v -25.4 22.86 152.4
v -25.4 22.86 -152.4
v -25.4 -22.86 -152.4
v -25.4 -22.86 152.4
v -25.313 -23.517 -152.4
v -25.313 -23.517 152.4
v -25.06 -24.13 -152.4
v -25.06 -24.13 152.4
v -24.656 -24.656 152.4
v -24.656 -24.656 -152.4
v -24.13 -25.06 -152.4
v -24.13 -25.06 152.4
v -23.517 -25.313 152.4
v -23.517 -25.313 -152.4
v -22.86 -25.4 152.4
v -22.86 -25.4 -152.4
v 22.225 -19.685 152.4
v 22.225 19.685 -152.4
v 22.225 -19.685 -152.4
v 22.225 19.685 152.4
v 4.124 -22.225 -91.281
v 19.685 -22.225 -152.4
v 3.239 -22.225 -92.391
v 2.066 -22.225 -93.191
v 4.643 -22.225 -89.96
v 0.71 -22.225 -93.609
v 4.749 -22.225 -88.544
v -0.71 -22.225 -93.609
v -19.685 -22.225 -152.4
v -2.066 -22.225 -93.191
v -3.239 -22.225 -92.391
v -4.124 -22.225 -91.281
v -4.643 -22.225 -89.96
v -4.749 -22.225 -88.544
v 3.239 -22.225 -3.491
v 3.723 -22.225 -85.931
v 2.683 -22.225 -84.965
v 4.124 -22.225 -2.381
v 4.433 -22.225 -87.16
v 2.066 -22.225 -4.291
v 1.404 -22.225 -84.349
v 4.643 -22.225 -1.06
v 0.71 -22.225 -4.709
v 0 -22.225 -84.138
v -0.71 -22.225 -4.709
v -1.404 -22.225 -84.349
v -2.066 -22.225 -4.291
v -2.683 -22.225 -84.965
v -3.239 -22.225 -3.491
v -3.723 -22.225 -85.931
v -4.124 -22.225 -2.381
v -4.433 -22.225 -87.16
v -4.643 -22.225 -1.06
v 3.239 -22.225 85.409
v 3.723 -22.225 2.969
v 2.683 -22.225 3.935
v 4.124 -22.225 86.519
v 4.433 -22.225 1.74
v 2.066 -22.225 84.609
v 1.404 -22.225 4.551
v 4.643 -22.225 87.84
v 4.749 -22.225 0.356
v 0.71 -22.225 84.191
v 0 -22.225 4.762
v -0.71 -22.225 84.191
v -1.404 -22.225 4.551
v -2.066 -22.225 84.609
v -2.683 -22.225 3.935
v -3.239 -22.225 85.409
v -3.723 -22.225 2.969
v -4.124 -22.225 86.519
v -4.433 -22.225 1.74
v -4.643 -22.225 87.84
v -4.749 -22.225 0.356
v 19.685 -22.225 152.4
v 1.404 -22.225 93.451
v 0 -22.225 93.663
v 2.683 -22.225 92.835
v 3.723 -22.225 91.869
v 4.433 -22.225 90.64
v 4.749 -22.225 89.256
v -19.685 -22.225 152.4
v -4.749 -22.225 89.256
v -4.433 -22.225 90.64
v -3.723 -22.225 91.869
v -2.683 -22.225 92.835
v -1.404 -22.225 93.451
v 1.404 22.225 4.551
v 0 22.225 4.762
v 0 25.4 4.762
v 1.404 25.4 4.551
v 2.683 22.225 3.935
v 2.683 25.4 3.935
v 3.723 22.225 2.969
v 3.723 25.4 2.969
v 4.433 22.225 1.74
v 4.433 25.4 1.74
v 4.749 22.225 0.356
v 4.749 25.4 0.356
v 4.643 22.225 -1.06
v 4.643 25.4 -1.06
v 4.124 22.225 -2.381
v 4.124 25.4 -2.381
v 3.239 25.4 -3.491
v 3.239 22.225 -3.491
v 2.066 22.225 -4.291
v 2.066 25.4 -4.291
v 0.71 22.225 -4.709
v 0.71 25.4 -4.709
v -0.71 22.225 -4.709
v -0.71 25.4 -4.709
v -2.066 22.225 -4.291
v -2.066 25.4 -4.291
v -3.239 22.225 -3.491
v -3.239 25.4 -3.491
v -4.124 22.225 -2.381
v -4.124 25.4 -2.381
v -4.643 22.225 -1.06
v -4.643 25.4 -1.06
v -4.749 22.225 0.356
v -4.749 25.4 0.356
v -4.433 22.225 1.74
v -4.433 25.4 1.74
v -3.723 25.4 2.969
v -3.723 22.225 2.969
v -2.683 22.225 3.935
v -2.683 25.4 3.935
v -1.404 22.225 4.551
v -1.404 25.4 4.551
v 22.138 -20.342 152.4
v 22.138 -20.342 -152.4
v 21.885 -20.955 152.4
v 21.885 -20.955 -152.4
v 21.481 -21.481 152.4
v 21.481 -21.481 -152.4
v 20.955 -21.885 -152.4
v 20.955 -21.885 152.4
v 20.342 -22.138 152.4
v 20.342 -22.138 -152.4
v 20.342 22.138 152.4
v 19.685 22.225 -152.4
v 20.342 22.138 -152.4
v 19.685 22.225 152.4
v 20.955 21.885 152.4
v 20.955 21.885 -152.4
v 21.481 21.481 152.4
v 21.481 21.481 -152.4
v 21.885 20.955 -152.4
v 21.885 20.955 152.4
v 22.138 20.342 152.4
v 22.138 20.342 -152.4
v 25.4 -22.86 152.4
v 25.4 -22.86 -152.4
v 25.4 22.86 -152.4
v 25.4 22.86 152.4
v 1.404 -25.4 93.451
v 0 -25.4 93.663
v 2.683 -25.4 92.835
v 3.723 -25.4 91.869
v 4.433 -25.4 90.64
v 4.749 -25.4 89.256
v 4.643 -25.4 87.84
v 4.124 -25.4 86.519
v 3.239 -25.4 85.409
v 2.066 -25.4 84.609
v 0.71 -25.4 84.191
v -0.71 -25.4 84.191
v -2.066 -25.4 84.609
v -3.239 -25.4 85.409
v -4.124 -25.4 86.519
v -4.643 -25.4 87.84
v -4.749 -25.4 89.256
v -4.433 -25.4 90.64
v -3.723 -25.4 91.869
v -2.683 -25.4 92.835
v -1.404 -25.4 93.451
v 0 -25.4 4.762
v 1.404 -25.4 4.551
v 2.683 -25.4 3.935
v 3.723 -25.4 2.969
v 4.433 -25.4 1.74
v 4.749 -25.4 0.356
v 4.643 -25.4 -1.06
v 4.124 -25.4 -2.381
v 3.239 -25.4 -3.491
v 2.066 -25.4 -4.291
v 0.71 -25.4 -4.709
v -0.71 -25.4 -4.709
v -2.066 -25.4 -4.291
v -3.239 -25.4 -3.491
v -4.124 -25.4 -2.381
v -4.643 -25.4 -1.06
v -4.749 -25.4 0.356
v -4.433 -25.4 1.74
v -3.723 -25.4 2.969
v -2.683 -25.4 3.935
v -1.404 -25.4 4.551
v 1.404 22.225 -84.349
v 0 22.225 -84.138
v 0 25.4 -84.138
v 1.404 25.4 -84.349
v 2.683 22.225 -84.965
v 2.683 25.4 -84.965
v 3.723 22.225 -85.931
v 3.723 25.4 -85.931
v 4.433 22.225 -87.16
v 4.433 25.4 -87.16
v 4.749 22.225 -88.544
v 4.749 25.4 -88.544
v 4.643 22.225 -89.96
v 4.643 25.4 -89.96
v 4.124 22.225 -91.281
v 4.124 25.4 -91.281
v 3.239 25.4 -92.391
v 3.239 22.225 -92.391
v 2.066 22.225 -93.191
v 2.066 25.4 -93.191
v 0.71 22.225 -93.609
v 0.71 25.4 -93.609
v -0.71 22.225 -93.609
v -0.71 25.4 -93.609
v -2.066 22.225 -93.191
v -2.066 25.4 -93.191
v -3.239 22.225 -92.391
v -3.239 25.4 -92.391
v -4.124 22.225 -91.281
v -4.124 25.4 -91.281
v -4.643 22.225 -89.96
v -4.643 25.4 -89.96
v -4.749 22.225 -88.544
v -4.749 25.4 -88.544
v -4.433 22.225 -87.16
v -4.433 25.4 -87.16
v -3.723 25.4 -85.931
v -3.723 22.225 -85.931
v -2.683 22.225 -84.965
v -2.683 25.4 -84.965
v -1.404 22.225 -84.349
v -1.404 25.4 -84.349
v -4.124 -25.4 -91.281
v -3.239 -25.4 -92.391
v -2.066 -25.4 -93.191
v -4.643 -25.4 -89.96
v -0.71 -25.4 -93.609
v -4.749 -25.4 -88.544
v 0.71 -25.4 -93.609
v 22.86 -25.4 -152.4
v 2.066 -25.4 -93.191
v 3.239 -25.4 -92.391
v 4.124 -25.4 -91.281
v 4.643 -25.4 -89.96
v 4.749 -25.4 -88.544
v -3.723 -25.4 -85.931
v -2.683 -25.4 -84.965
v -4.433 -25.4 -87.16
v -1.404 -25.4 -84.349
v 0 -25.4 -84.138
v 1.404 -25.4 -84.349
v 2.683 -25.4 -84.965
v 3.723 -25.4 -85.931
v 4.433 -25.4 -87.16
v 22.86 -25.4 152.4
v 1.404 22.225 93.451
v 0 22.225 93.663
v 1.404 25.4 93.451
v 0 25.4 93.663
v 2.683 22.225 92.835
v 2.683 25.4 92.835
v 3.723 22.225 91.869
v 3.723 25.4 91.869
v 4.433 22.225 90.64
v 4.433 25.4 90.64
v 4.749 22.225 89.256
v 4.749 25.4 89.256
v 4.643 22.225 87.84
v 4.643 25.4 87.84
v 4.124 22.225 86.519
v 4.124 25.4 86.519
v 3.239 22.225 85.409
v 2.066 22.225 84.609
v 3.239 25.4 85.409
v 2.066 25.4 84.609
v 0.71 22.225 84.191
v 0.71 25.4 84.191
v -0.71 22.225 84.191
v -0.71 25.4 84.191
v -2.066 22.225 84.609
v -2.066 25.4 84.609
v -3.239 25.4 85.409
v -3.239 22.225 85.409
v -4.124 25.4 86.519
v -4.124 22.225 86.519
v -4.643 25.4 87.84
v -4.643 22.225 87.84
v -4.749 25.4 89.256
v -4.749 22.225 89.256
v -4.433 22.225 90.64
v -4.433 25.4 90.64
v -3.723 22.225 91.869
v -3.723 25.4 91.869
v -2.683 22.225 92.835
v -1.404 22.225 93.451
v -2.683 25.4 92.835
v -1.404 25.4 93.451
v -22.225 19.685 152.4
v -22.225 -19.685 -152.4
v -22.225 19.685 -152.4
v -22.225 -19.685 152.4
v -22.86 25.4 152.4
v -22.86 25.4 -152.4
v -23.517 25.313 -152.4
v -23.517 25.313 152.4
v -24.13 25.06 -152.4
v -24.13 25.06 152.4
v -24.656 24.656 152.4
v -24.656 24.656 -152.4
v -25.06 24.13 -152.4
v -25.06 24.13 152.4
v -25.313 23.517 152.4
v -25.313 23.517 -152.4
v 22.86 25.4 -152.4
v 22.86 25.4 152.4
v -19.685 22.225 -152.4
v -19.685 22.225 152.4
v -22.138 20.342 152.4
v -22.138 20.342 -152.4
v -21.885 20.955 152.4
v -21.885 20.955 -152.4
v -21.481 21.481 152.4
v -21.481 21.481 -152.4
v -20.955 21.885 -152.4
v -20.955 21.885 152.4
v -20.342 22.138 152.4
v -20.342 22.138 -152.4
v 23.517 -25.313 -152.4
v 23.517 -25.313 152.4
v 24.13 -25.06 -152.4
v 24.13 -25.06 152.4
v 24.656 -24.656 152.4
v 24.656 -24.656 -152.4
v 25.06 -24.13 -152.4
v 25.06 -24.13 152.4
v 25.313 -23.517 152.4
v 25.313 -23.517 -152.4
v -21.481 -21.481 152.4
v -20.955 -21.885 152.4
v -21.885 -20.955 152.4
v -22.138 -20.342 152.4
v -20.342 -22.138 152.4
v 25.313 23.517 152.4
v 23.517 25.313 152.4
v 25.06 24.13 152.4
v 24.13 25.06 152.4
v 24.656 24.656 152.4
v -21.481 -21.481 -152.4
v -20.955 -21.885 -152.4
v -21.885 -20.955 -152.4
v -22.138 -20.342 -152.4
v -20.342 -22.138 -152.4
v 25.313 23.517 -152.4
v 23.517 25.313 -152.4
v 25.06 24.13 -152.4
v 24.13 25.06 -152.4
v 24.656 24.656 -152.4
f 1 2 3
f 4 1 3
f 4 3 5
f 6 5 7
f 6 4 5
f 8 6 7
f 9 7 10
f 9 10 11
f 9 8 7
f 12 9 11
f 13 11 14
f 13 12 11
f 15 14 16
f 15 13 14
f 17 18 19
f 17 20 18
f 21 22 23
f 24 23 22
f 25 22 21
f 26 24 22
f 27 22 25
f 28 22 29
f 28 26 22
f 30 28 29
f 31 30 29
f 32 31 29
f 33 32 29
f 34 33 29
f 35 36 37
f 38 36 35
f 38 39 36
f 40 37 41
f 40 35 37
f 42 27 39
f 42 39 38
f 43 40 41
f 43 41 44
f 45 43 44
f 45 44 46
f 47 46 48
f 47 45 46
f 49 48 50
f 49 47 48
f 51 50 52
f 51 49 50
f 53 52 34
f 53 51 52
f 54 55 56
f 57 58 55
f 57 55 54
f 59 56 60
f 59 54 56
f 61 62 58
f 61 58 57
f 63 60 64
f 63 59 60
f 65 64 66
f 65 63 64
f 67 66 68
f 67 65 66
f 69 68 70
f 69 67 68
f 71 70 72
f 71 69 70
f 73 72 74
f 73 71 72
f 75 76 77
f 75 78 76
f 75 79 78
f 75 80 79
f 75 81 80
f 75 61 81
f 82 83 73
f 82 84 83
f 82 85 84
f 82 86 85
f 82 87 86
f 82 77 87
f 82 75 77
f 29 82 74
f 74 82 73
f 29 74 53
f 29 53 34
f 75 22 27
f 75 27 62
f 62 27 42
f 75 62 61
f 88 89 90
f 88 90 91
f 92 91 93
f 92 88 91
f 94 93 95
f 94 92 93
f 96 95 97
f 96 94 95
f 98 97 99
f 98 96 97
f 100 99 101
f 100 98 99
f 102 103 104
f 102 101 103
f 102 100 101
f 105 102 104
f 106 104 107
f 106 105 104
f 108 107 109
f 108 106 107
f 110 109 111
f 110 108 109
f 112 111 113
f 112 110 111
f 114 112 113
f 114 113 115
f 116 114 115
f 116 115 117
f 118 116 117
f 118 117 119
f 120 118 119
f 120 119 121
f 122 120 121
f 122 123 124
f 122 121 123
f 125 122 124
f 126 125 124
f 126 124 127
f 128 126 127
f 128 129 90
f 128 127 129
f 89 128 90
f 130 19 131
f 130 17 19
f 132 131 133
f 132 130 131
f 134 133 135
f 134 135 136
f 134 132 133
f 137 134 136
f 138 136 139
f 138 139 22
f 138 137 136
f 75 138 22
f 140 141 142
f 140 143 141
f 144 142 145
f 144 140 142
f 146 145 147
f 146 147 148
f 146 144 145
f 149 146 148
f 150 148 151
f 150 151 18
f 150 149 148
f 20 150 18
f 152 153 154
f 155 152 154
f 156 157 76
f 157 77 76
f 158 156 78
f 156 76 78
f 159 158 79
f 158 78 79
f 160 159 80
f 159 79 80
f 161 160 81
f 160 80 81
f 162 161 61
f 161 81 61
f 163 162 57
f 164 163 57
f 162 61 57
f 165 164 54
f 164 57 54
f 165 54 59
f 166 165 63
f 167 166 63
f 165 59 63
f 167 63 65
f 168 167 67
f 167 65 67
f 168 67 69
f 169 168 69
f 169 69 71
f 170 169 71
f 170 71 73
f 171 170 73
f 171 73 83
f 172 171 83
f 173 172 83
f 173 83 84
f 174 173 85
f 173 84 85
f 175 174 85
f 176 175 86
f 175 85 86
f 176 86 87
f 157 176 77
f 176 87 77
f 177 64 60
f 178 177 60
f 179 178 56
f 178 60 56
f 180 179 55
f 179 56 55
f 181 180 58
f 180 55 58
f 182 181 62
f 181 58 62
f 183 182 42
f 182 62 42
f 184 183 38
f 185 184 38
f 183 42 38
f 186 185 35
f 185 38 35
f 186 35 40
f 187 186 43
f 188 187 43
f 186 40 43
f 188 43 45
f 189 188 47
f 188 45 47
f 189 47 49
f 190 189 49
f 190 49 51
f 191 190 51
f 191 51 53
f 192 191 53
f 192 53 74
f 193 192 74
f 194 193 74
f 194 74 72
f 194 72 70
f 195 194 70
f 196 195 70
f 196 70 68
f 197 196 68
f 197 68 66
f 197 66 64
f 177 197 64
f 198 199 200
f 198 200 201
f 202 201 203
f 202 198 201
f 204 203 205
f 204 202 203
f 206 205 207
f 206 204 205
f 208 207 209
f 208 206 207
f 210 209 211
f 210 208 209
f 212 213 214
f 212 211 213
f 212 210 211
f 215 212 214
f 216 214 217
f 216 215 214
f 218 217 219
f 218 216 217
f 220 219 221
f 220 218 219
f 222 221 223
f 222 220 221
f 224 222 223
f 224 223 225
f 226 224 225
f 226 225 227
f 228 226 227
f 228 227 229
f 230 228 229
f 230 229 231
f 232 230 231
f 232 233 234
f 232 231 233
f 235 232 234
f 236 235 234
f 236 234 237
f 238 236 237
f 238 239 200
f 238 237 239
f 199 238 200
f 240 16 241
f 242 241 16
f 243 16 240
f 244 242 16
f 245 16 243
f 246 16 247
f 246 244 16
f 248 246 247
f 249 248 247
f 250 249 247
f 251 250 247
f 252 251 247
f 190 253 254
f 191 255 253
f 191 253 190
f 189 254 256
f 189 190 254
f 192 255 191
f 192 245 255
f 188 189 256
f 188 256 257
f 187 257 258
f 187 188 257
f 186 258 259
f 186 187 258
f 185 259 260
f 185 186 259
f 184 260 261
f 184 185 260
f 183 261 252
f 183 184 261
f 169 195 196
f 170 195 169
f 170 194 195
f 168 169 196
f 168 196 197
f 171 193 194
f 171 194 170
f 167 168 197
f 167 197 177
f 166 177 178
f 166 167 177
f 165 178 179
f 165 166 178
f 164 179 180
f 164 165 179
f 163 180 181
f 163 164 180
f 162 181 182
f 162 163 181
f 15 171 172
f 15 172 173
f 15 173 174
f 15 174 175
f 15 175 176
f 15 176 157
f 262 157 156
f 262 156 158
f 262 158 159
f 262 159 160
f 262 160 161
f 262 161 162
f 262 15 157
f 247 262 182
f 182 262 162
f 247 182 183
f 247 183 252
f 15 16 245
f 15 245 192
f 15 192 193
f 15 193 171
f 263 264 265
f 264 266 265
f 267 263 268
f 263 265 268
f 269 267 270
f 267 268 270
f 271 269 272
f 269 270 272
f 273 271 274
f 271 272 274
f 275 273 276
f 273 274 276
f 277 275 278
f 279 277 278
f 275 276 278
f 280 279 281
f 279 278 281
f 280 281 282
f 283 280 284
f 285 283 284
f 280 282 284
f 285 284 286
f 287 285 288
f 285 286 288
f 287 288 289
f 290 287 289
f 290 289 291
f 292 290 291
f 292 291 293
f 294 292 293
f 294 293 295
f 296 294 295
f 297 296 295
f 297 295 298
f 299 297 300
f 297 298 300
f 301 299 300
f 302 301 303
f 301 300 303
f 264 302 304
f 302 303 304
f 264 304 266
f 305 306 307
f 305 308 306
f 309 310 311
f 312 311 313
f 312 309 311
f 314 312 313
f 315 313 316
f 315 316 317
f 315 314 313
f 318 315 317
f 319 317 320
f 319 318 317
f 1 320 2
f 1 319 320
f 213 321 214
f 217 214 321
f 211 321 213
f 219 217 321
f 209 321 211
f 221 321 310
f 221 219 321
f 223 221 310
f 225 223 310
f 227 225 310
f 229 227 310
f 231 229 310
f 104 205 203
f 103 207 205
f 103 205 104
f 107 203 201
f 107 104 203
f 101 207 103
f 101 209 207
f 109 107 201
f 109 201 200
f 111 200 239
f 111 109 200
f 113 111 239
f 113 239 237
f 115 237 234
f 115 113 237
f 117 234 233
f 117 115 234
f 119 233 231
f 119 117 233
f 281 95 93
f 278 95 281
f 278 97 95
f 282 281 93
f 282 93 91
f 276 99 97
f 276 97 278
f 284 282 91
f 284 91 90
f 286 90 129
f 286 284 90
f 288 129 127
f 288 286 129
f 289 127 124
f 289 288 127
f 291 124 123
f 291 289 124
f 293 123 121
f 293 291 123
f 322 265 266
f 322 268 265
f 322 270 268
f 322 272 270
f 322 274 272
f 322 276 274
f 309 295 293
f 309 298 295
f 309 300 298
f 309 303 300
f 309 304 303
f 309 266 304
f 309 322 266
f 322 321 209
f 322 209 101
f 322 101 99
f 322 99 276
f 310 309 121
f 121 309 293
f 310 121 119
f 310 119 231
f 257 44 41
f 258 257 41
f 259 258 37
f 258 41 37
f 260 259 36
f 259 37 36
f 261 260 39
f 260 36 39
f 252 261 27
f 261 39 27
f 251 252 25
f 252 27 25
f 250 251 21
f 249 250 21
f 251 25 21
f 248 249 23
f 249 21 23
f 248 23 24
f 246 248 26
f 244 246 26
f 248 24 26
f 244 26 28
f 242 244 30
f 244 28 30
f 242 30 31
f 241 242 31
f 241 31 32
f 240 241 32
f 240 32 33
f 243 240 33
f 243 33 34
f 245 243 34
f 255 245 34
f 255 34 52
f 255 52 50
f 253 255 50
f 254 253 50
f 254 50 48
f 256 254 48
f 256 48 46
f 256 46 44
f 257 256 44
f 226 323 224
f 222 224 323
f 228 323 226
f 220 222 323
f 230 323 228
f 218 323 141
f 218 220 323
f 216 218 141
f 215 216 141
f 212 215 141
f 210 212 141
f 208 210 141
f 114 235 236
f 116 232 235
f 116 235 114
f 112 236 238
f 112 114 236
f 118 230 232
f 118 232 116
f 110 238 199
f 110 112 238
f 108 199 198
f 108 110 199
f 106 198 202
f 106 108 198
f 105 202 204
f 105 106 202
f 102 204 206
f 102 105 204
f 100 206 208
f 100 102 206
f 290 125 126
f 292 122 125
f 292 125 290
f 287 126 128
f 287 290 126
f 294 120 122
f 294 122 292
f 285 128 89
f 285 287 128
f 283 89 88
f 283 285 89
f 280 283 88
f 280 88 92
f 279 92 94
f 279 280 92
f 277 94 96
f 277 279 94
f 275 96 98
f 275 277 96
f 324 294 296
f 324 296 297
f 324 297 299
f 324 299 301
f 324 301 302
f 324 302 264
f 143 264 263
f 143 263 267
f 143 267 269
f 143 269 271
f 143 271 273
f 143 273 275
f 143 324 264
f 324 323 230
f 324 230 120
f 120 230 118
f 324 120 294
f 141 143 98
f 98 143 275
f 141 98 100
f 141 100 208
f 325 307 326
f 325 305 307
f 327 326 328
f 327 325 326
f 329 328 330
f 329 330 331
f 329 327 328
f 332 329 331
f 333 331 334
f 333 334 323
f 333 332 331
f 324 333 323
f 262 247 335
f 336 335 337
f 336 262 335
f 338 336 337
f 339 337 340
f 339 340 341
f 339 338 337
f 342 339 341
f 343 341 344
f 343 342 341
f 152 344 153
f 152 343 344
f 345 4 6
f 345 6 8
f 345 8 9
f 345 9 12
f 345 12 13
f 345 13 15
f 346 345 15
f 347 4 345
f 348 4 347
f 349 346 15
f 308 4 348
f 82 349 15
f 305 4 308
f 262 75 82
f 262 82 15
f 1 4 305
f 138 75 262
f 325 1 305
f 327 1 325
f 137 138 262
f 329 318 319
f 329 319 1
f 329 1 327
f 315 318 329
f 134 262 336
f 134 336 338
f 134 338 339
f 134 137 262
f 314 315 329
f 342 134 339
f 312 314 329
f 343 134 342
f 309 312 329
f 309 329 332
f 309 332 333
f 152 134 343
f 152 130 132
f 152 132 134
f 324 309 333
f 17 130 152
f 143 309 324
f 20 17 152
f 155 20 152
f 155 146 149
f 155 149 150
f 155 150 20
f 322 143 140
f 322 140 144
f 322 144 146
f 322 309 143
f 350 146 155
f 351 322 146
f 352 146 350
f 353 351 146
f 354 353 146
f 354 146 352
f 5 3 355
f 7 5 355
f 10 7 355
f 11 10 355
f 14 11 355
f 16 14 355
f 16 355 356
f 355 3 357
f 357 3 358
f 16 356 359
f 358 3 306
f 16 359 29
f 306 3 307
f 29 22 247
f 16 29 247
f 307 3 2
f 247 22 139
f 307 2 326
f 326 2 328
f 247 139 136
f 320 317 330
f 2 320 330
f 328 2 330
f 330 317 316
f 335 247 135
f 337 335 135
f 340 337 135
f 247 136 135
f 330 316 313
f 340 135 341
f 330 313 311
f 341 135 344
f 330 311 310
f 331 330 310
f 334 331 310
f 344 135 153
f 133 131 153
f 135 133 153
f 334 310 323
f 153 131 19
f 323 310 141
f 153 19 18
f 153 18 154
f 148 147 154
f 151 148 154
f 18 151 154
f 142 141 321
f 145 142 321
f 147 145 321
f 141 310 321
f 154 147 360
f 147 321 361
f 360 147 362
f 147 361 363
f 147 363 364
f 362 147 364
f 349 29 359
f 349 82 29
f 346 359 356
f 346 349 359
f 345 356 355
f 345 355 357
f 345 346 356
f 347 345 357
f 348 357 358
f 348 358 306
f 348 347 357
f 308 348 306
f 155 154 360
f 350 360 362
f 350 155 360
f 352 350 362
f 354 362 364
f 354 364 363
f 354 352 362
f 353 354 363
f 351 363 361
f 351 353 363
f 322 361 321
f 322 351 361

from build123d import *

# Parameters (mm, degrees)
BOSS_EXTRUDE1_DEPTH = 152.4
SKETCH2_R           = 4.7625
CUT_EXTRUDE1_DEPTH  = 76.2


with BuildPart() as part:
    # Sketch1 → Boss-Extrude1 (new, symmetric)
    with BuildSketch(Plane.XY):
        with BuildLine():
            Line((-22.86, -25.4), (22.86, -25.4))
            ThreePointArc((22.86, -25.4), (24.656051224, -24.656051224), (25.4, -22.86))
            Line((25.4, -22.86), (25.4, 22.86))
            ThreePointArc((25.4, 22.86), (24.656051224, 24.656051224), (22.86, 25.4))
            Line((22.86, 25.4), (-22.86, 25.4))
            ThreePointArc((-22.86, 25.4), (-24.656051224, 24.656051224), (-25.4, 22.86))
            Line((-25.4, 22.86), (-25.4, -22.86))
            ThreePointArc((-25.4, -22.86), (-24.656051224, -24.656051224), (-22.86, -25.4))
        make_face()
        with BuildLine():
            Line((-19.685, 22.225), (19.685, 22.225))
            ThreePointArc((19.685, 22.225), (21.481051224, 21.481051224), (22.225, 19.685))
            Line((22.225, 19.685), (22.225, -19.685))
            ThreePointArc((22.225, -19.685), (21.481051224, -21.481051224), (19.685, -22.225))
            Line((19.685, -22.225), (-19.685, -22.225))
            ThreePointArc((-19.685, -22.225), (-21.481051224, -21.481051224), (-22.225, -19.685))
            Line((-22.225, -19.685), (-22.225, 19.685))
            ThreePointArc((-22.225, 19.685), (-21.481051224, 21.481051224), (-19.685, 22.225))
        make_face(mode=Mode.SUBTRACT)
    extrude(amount=BOSS_EXTRUDE1_DEPTH, both=True)

    # Sketch2 → Cut-Extrude1 (cut, symmetric)
    with BuildSketch(Plane(origin=(0, 0, 0), x_dir=(1, 0, 0), z_dir=(0, 1, 0))):
        with Locations(Location((0, 0, 0), (0, 0, 270))):
            Circle(SKETCH2_R)
        with Locations(Location((0, 88.9, 0), (0, 0, 270))):
            Circle(SKETCH2_R)
        with Locations(Location((0, -88.9, 0), (0, 0, 270))):
            Circle(SKETCH2_R)
    extrude(amount=CUT_EXTRUDE1_DEPTH, both=True, mode=Mode.SUBTRACT)


solid = part.part
